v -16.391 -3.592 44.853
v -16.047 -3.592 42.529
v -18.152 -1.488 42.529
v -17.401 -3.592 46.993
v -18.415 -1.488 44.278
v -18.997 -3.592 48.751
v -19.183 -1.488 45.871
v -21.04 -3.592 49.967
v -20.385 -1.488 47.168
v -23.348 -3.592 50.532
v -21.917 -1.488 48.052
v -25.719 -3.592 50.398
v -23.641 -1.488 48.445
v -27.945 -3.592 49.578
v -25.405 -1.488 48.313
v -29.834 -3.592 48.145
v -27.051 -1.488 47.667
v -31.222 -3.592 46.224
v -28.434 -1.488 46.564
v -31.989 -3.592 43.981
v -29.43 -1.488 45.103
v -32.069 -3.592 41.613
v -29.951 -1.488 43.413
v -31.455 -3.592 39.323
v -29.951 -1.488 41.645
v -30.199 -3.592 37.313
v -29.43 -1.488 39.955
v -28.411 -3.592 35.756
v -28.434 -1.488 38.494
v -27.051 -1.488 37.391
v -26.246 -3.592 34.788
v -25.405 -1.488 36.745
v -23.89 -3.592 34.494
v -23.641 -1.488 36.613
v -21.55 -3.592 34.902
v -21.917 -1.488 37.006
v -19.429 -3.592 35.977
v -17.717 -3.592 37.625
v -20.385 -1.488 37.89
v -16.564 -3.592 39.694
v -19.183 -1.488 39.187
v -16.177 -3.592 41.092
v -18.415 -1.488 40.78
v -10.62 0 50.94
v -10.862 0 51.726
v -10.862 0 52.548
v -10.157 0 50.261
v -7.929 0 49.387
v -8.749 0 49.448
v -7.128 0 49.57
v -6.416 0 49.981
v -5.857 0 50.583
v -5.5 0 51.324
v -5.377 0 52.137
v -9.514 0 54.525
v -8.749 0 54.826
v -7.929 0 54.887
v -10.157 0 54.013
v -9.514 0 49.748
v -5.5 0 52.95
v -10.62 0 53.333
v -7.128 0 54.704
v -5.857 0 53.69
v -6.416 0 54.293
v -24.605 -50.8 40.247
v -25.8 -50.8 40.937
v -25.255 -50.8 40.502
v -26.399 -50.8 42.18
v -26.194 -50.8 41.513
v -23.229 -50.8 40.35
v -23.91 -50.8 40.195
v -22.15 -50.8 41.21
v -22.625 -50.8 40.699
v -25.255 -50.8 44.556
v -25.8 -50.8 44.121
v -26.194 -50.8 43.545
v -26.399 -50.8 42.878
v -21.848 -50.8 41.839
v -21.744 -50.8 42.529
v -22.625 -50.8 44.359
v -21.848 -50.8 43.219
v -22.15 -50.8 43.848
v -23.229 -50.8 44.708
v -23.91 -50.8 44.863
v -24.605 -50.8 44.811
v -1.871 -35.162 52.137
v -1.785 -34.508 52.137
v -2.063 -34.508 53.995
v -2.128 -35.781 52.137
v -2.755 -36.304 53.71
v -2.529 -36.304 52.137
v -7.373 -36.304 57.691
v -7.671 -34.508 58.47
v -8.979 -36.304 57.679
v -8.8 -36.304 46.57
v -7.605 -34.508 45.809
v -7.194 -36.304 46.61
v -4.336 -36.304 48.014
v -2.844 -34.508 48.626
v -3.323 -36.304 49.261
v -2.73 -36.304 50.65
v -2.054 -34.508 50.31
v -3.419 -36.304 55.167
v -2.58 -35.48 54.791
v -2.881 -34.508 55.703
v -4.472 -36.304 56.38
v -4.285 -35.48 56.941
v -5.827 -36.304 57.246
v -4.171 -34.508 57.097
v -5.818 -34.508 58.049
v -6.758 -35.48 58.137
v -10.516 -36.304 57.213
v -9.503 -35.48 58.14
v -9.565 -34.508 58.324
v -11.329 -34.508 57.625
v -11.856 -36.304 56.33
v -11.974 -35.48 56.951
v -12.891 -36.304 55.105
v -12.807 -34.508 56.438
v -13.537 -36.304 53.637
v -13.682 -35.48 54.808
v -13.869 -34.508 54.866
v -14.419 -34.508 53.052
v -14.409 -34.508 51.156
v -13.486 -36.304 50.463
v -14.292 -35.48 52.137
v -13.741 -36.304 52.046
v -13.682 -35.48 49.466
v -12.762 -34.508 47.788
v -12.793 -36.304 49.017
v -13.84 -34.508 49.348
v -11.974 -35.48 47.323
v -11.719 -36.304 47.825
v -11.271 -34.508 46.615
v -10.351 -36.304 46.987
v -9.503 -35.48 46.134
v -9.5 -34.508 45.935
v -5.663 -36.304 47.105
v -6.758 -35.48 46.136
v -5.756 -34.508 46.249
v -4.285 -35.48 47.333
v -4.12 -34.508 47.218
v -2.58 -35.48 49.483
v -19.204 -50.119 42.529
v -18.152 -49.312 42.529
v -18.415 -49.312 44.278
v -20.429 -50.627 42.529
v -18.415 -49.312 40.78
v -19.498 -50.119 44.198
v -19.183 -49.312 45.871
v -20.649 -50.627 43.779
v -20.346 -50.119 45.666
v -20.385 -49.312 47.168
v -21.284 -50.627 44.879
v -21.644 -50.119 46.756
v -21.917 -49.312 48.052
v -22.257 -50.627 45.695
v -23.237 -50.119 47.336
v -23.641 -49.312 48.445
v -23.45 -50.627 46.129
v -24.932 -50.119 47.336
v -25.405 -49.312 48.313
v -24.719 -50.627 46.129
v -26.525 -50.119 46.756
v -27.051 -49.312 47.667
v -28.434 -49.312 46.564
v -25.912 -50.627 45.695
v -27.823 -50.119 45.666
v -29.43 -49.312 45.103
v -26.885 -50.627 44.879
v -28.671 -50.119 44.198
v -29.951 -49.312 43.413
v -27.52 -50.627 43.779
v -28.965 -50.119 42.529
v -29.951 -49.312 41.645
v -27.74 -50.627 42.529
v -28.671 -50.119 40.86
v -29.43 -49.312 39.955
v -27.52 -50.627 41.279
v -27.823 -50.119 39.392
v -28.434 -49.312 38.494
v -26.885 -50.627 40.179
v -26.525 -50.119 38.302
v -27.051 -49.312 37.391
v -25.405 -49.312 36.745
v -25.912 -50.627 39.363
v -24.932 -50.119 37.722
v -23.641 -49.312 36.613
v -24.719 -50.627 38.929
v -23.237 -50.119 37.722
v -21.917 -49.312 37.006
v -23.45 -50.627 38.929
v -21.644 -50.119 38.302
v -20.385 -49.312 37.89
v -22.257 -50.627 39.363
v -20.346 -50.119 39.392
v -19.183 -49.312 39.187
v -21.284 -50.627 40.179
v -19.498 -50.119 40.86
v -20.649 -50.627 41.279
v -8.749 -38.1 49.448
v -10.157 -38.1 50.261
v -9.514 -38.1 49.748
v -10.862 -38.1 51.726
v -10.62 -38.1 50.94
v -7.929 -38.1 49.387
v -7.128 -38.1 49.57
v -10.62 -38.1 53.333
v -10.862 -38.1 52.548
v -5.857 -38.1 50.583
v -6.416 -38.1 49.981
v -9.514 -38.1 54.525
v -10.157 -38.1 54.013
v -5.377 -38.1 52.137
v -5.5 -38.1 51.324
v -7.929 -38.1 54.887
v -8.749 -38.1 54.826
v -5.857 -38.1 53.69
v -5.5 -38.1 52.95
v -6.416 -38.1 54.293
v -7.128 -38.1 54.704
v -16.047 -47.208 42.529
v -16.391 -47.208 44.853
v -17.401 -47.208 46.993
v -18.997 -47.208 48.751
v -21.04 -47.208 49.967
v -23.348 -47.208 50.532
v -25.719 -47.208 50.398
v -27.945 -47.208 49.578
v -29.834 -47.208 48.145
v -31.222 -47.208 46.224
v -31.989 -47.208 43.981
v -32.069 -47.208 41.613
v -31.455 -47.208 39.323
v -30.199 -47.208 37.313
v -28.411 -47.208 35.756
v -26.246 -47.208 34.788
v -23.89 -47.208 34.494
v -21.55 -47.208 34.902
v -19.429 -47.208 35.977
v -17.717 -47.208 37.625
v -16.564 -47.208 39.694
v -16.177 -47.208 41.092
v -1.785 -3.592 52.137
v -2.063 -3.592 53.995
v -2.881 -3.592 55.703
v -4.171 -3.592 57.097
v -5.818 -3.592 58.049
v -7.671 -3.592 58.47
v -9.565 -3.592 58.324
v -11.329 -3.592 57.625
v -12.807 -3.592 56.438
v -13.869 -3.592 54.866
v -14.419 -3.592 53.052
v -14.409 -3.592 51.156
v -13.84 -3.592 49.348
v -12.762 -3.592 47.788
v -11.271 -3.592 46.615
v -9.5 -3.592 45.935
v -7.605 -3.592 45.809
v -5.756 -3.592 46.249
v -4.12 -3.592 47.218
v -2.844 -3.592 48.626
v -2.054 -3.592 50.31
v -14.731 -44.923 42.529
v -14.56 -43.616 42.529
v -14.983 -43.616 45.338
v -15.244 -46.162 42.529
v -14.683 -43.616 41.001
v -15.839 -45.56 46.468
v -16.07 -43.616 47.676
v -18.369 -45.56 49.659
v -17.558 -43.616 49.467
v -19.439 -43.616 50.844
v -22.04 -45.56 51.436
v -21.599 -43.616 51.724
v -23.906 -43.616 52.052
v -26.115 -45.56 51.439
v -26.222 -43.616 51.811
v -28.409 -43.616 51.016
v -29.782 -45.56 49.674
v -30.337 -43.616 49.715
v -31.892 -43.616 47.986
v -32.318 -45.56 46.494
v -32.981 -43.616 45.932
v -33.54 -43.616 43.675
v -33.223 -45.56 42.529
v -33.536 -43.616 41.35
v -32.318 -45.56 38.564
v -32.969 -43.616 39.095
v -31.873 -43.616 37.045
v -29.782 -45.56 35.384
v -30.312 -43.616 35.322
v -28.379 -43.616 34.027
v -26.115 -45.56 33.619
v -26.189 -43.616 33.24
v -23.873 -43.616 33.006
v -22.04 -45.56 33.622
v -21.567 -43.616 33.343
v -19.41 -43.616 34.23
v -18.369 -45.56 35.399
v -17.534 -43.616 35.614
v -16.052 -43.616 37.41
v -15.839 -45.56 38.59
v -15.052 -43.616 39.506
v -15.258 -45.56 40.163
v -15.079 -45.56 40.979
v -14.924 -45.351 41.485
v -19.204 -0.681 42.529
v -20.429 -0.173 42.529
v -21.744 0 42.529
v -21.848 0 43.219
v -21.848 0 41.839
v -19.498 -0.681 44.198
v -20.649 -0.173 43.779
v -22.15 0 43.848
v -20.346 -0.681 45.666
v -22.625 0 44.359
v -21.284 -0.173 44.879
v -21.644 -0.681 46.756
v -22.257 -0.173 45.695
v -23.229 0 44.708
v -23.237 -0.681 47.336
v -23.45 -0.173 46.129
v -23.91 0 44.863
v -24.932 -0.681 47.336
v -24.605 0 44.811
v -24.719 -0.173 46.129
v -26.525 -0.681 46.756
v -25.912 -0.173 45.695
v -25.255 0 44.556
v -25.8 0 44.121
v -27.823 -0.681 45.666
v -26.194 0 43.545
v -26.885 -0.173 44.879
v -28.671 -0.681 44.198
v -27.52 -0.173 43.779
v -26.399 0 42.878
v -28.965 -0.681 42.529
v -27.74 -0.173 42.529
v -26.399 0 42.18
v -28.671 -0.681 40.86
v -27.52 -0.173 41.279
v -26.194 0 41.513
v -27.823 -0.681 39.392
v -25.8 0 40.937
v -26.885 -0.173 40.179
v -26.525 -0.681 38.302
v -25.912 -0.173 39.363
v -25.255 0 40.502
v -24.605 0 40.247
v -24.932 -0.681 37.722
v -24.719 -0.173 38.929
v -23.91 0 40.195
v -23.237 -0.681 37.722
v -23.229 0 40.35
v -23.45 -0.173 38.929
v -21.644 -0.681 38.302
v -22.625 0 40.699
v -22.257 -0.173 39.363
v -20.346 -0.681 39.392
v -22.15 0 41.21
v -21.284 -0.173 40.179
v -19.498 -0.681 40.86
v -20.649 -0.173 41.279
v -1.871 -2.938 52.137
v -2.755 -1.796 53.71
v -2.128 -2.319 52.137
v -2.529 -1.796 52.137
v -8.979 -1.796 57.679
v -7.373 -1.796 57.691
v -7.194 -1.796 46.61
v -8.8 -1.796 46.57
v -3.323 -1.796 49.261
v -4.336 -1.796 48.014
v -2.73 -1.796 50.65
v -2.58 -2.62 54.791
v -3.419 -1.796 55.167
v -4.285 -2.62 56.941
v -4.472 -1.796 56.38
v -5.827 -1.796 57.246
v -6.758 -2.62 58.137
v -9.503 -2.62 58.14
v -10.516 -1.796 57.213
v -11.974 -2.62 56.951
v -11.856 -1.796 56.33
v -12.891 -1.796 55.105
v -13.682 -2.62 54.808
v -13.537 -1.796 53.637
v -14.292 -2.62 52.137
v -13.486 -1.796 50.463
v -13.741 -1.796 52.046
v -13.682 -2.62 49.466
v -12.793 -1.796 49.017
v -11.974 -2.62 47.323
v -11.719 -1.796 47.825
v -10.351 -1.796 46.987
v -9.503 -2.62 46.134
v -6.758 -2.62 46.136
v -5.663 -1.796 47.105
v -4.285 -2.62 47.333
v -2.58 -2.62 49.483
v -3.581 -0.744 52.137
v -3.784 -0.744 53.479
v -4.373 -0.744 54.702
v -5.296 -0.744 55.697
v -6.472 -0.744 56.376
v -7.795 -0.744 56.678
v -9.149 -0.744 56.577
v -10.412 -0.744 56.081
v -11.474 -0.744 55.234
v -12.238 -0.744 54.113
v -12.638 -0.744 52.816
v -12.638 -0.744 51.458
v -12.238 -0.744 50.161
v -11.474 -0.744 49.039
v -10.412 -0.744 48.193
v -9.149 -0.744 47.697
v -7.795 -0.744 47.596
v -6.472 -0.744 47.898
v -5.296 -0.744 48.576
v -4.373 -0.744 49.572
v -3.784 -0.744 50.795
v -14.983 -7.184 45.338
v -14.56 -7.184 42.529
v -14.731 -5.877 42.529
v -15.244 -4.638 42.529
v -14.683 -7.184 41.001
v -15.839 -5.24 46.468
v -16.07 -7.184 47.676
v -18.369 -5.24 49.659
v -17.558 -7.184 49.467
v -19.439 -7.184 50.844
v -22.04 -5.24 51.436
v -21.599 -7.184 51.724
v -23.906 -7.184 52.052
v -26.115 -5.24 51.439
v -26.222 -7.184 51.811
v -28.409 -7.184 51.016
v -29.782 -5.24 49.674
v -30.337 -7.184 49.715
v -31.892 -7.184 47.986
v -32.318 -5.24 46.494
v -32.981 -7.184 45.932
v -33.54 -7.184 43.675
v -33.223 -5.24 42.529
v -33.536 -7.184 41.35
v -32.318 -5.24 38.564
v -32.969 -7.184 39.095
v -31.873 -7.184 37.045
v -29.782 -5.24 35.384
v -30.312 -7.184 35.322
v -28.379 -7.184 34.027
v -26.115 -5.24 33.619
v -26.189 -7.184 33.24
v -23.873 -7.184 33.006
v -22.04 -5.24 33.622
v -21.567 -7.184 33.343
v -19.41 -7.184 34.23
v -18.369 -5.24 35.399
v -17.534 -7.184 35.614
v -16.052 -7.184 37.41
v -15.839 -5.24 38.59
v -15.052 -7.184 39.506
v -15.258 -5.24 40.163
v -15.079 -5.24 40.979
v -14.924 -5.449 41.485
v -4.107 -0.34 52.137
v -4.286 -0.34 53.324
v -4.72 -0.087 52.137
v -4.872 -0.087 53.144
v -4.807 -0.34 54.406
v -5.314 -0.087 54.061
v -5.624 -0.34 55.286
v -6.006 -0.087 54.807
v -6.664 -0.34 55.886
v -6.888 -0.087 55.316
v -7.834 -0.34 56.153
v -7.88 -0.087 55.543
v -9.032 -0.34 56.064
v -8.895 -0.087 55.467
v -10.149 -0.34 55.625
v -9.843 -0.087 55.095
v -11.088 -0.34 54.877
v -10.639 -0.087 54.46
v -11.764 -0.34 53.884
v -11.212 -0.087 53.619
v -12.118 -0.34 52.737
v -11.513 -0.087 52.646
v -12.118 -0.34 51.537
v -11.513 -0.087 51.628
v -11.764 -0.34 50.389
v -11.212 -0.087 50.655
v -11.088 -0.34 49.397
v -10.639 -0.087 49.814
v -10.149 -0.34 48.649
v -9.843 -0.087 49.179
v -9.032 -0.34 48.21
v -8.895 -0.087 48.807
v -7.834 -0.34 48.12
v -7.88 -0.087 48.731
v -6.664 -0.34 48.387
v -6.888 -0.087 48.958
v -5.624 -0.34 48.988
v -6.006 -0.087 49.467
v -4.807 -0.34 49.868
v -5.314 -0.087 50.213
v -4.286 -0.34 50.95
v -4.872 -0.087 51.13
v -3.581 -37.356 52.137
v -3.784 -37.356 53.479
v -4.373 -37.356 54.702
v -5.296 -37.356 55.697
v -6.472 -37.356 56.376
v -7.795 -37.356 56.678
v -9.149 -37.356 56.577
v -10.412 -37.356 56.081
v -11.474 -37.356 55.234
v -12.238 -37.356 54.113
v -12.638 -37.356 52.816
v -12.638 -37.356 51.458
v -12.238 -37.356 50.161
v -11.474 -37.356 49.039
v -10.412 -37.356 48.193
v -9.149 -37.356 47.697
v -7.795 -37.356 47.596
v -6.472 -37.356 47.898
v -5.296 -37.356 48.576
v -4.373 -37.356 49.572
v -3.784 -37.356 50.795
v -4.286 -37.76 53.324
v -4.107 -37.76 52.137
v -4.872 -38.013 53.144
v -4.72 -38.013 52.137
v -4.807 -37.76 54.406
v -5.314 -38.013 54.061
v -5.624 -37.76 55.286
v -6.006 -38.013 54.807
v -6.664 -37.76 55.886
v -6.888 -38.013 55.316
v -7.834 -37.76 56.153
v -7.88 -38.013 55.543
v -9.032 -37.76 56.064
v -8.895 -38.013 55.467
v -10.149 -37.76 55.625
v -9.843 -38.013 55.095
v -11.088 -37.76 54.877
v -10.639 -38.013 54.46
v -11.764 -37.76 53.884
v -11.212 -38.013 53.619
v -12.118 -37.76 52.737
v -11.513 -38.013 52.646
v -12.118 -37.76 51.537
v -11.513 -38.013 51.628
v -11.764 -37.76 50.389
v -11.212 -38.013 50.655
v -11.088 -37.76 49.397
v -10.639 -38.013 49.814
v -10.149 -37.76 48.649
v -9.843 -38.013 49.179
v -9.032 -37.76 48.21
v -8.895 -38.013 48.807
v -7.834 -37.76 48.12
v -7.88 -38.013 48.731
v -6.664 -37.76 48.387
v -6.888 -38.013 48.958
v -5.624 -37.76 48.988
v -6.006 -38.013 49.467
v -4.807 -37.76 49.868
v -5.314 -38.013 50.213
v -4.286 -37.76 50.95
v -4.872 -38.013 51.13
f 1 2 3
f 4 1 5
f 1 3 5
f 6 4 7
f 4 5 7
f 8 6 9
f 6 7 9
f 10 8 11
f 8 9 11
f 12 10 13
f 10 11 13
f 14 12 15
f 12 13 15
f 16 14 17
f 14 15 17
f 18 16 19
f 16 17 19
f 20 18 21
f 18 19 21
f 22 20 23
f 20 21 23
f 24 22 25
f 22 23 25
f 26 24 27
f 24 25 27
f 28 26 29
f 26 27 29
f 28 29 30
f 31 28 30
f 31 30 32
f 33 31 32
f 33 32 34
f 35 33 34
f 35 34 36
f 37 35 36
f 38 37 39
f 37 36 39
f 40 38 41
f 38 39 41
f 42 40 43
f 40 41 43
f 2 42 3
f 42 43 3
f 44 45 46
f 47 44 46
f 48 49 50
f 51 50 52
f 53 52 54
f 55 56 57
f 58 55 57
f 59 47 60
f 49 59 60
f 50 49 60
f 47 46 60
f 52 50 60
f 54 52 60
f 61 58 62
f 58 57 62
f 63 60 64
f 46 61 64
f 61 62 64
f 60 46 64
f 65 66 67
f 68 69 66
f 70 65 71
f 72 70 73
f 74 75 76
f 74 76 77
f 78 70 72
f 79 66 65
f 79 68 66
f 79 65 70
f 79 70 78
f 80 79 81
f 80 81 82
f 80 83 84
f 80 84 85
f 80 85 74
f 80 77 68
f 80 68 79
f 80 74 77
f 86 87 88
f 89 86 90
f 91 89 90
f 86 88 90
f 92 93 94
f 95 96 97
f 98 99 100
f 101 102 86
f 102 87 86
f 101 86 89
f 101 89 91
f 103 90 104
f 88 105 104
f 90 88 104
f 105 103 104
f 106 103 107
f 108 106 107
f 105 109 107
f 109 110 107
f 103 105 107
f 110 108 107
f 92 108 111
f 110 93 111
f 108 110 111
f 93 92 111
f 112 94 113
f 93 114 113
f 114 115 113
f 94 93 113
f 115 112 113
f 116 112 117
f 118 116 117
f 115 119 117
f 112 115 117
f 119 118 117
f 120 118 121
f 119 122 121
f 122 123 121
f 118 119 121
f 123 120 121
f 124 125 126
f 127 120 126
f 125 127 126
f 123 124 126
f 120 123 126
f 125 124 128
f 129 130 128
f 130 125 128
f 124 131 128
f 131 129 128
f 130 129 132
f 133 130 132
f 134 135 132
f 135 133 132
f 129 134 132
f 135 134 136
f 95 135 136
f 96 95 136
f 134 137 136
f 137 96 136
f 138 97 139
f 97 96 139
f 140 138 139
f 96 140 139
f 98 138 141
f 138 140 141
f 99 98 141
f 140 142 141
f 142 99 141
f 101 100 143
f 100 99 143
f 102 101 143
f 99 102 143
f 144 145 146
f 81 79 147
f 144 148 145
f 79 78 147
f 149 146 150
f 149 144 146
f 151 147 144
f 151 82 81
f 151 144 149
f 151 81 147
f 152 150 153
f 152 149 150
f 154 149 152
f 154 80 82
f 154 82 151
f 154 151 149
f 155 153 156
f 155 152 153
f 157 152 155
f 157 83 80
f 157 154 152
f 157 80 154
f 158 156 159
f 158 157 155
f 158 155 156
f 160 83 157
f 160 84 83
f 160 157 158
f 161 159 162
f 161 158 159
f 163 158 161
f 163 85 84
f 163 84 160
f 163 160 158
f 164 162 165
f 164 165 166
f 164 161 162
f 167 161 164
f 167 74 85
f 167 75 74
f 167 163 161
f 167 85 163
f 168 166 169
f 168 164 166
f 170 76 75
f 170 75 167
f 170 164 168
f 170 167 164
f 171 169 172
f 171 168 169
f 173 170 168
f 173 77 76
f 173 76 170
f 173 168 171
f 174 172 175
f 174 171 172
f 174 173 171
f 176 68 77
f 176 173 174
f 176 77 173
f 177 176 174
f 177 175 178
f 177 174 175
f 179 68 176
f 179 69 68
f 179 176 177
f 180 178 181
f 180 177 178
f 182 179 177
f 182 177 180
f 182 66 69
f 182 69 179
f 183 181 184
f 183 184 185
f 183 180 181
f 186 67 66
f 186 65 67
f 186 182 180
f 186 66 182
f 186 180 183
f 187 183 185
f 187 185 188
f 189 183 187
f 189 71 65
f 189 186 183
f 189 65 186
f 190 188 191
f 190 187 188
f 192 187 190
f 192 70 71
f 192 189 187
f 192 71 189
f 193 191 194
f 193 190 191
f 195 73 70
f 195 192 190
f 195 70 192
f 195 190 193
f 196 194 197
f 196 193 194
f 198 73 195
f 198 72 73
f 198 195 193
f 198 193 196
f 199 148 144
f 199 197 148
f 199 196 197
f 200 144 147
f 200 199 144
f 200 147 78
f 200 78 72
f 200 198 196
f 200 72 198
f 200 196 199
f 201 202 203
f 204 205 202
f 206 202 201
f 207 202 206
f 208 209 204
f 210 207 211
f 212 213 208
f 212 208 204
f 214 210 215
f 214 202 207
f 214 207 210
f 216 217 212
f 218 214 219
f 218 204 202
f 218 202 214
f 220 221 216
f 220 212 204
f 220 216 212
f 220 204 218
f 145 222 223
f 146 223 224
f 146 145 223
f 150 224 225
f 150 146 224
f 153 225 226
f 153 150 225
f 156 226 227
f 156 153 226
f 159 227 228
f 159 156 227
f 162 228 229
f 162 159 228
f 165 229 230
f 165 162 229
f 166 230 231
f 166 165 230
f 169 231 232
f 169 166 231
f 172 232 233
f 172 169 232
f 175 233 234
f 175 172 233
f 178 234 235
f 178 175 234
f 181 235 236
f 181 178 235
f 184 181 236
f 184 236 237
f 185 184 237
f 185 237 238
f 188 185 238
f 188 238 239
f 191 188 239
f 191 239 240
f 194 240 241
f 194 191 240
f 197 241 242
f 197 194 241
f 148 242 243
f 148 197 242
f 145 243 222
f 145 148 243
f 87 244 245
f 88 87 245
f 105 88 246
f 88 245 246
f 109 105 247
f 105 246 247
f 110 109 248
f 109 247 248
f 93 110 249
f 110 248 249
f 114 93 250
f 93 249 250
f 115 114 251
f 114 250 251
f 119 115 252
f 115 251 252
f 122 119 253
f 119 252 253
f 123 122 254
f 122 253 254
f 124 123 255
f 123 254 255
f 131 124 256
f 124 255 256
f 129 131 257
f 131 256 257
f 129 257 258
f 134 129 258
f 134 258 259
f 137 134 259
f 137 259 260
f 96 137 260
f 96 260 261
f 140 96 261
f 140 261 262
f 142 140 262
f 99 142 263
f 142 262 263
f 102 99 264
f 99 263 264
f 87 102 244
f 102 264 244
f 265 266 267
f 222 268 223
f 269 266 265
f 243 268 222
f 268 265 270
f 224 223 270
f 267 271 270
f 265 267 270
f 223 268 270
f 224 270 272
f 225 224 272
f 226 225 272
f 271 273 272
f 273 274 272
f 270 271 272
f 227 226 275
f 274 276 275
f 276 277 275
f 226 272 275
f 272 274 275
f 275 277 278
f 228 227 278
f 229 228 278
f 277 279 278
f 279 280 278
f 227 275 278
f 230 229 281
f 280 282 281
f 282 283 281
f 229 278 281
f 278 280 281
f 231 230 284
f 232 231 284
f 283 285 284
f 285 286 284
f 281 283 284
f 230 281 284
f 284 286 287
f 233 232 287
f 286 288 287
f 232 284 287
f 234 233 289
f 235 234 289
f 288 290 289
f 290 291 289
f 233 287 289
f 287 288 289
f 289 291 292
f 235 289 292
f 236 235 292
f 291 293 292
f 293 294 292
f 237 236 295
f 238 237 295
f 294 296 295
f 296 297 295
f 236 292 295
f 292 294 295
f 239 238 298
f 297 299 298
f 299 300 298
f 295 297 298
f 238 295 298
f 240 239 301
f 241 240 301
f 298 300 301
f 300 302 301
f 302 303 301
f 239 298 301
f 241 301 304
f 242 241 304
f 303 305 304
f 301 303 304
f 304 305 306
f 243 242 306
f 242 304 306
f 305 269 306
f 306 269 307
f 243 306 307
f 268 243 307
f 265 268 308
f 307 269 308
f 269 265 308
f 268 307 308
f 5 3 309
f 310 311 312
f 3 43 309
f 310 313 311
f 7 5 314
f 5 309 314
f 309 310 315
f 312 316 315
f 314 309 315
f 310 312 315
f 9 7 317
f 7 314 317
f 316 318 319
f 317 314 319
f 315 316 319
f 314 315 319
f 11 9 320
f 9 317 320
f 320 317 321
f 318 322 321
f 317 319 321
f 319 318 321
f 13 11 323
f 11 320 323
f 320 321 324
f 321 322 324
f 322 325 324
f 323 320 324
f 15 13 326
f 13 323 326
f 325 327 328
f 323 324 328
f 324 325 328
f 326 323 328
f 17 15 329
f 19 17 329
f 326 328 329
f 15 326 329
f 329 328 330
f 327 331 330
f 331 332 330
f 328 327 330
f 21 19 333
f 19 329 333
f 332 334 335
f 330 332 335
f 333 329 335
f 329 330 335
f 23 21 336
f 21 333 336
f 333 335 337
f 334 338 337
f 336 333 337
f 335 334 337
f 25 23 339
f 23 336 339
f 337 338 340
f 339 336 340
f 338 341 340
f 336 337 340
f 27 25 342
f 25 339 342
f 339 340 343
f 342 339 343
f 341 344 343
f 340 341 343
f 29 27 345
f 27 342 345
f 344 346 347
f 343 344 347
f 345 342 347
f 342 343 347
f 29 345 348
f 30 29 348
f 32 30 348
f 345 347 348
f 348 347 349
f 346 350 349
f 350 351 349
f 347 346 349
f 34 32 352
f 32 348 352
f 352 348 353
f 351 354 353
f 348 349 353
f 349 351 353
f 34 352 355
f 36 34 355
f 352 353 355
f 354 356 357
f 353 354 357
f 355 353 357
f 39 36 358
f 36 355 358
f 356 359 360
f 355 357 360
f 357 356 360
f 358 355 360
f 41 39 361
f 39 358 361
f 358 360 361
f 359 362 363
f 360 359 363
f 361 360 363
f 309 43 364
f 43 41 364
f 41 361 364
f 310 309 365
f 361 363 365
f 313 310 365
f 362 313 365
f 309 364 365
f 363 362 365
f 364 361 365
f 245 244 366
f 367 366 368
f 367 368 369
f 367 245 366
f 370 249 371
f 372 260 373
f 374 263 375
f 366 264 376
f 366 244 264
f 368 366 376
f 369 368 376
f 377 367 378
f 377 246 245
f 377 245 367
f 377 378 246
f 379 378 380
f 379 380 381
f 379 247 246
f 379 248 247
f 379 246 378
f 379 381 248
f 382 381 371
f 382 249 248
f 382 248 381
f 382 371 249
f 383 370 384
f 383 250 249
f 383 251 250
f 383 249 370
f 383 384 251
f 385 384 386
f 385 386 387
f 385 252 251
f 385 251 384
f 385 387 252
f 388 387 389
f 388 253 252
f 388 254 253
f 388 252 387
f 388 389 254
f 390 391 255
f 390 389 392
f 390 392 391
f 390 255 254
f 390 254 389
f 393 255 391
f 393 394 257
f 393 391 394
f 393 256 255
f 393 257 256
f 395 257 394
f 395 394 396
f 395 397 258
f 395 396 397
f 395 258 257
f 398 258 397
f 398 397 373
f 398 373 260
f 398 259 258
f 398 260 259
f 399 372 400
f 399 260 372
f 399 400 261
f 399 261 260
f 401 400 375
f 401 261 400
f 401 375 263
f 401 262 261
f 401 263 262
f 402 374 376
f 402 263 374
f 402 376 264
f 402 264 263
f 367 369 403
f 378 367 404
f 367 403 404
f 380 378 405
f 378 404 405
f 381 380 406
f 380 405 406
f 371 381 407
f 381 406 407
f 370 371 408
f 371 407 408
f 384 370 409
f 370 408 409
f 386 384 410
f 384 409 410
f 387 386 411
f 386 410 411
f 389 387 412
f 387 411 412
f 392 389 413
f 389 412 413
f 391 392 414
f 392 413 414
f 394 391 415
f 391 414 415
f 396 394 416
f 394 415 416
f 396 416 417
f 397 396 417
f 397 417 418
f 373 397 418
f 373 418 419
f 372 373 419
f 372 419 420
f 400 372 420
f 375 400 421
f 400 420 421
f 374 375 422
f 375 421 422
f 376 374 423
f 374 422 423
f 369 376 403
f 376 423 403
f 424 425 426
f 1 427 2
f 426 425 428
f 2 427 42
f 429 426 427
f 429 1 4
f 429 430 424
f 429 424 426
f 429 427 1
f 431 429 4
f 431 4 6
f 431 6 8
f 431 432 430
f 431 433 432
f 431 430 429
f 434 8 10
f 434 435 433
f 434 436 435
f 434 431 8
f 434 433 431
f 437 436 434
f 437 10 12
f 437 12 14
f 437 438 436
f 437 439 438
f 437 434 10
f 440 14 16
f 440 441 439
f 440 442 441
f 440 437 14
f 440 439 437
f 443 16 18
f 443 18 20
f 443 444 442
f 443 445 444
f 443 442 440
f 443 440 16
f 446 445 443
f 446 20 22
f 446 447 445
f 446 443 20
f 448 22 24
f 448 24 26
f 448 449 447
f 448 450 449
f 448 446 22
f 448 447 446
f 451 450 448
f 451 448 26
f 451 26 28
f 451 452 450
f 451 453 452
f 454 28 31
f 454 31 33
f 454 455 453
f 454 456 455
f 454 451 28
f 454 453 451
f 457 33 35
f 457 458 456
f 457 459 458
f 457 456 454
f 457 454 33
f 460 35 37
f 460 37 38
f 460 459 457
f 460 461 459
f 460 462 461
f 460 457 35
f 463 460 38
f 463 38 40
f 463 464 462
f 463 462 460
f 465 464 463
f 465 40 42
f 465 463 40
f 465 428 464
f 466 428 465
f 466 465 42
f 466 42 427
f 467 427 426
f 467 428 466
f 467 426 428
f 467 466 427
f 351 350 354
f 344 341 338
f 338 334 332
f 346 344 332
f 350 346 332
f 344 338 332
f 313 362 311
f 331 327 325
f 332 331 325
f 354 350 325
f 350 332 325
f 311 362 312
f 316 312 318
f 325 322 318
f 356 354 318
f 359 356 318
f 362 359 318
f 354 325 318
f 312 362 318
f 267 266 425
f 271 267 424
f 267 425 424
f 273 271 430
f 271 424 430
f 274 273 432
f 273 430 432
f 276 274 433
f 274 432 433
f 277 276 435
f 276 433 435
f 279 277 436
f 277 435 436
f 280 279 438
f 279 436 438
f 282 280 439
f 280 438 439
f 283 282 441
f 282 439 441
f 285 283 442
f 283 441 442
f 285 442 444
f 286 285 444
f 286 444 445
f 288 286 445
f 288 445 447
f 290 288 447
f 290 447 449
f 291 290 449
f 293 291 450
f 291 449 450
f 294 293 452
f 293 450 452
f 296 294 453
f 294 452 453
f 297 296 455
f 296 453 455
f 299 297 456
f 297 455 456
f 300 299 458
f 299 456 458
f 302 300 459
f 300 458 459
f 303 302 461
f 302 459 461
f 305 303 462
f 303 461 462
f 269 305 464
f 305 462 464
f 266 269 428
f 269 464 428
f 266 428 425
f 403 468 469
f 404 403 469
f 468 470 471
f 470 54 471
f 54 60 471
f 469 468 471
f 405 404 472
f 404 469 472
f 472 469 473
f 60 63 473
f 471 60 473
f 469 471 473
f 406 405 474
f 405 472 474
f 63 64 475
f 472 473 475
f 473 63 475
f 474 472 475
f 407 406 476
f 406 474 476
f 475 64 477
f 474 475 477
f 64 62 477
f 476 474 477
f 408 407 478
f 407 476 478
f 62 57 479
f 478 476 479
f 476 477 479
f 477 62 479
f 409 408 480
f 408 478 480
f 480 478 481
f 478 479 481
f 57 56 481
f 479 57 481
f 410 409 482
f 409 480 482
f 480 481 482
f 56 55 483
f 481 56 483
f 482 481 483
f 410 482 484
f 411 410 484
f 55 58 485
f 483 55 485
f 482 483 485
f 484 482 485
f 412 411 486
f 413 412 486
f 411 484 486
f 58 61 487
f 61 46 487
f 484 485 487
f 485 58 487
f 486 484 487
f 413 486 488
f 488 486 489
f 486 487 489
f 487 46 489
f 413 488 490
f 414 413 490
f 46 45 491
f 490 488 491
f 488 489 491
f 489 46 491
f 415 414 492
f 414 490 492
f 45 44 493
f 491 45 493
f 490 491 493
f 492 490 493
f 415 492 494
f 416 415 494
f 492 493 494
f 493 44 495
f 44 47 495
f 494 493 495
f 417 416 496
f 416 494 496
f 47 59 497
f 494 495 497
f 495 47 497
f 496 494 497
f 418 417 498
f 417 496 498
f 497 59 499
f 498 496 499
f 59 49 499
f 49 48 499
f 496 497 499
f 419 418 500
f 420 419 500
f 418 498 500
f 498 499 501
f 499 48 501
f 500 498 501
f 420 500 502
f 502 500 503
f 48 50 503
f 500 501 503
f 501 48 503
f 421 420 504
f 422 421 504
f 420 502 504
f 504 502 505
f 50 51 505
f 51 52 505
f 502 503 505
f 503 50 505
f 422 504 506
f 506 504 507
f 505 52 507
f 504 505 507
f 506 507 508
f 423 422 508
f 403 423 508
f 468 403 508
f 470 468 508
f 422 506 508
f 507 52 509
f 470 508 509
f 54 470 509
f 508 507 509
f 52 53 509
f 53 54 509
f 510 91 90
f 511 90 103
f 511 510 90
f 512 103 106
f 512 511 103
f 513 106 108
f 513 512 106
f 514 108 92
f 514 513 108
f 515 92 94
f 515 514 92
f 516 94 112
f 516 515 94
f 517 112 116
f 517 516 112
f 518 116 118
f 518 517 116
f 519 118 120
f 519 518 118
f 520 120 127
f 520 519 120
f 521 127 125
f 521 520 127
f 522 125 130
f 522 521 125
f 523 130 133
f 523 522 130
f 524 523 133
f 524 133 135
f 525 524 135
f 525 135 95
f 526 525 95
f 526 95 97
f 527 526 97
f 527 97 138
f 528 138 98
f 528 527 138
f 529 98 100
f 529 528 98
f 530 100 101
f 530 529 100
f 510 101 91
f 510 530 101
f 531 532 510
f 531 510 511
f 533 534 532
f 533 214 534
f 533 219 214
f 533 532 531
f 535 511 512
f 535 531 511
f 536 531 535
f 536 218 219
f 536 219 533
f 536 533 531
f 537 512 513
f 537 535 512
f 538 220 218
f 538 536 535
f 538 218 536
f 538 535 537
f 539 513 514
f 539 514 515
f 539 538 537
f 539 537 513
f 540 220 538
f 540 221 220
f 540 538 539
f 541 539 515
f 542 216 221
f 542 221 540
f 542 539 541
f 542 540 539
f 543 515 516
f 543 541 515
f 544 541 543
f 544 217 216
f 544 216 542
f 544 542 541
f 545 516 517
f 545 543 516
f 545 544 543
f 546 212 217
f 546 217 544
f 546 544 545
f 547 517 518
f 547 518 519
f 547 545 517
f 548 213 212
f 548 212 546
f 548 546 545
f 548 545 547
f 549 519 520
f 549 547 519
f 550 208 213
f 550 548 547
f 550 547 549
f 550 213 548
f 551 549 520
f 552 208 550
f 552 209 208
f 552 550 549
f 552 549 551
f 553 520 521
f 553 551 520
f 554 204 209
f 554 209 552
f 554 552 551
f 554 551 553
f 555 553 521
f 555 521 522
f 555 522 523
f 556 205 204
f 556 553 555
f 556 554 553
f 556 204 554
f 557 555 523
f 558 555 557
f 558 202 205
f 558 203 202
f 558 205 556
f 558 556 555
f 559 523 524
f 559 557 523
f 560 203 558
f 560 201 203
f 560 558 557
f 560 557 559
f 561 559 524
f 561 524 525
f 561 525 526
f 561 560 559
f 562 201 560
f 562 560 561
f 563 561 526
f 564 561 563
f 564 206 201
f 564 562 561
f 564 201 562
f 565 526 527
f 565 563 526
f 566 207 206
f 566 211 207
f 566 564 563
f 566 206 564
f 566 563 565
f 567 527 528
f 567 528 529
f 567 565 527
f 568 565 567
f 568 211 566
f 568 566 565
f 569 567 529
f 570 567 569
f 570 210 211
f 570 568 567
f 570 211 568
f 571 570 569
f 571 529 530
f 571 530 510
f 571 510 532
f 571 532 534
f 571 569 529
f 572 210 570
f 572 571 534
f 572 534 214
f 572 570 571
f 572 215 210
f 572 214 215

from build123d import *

# Parameters (mm, degrees)
F0_R     = 9.525
F1_DEPTH = 50.8
F2_SIZE  = 5.08
F3_R     = 5.08
F0_R_2   = 6.35
F4_DEPTH = 38.1
F5_SIZE  = 2.54
F6_R     = 2.54


with BuildPart() as f1:
    # F0 (on Front) → F1 (new body)
    with BuildSketch(Plane.XZ):
        with Locations((-24.0845345118, 42.5289943814)):
            Circle(F0_R)
    extrude(amount=F1_DEPTH)

    # F2
    f2_edges = [f1.edges().sort_by_distance(p)[0] for p in [
        (-33.609535, -50.8, 42.528994),
        (-33.609535, 0, 42.528994),
    ]]
    chamfer(f2_edges, length=F2_SIZE)

    # F3
    f3_edges = [f1.edges().sort_by_distance(p)[0] for p in [
        (-28.529535, -50.8, 42.528994),
        (-33.609535, -45.72, 42.528994),
        (-28.529535, 0, 42.528994),
        (-33.609535, -5.08, 42.528994),
    ]]
    fillet(f3_edges, radius=F3_R)


with BuildPart() as f4:
    # F0 (on Front) → F4 (new body)
    with BuildSketch(Plane.XZ):
        with Locations((-8.1353727403, 52.1368345658)):
            Circle(F0_R_2)
    extrude(amount=F4_DEPTH)

    # F5
    f5_edges = [f4.edges().sort_by_distance(p)[0] for p in [
        (-14.485373, 0, 52.136835),
        (-14.485373, -38.1, 52.136835),
    ]]
    chamfer(f5_edges, length=F5_SIZE)

    # F6
    f6_edges = [f4.edges().sort_by_distance(p)[0] for p in [
        (-11.945373, -38.1, 52.136835),
        (-3.055373, -36.83, 52.136835),
        (-14.485373, -35.56, 52.136835),
        (-14.485373, -2.54, 52.136835),
        (-11.945373, 0, 52.136835),
    ]]
    fillet(f6_edges, radius=F6_R)


solid = Compound([f1.part, f4.part])
